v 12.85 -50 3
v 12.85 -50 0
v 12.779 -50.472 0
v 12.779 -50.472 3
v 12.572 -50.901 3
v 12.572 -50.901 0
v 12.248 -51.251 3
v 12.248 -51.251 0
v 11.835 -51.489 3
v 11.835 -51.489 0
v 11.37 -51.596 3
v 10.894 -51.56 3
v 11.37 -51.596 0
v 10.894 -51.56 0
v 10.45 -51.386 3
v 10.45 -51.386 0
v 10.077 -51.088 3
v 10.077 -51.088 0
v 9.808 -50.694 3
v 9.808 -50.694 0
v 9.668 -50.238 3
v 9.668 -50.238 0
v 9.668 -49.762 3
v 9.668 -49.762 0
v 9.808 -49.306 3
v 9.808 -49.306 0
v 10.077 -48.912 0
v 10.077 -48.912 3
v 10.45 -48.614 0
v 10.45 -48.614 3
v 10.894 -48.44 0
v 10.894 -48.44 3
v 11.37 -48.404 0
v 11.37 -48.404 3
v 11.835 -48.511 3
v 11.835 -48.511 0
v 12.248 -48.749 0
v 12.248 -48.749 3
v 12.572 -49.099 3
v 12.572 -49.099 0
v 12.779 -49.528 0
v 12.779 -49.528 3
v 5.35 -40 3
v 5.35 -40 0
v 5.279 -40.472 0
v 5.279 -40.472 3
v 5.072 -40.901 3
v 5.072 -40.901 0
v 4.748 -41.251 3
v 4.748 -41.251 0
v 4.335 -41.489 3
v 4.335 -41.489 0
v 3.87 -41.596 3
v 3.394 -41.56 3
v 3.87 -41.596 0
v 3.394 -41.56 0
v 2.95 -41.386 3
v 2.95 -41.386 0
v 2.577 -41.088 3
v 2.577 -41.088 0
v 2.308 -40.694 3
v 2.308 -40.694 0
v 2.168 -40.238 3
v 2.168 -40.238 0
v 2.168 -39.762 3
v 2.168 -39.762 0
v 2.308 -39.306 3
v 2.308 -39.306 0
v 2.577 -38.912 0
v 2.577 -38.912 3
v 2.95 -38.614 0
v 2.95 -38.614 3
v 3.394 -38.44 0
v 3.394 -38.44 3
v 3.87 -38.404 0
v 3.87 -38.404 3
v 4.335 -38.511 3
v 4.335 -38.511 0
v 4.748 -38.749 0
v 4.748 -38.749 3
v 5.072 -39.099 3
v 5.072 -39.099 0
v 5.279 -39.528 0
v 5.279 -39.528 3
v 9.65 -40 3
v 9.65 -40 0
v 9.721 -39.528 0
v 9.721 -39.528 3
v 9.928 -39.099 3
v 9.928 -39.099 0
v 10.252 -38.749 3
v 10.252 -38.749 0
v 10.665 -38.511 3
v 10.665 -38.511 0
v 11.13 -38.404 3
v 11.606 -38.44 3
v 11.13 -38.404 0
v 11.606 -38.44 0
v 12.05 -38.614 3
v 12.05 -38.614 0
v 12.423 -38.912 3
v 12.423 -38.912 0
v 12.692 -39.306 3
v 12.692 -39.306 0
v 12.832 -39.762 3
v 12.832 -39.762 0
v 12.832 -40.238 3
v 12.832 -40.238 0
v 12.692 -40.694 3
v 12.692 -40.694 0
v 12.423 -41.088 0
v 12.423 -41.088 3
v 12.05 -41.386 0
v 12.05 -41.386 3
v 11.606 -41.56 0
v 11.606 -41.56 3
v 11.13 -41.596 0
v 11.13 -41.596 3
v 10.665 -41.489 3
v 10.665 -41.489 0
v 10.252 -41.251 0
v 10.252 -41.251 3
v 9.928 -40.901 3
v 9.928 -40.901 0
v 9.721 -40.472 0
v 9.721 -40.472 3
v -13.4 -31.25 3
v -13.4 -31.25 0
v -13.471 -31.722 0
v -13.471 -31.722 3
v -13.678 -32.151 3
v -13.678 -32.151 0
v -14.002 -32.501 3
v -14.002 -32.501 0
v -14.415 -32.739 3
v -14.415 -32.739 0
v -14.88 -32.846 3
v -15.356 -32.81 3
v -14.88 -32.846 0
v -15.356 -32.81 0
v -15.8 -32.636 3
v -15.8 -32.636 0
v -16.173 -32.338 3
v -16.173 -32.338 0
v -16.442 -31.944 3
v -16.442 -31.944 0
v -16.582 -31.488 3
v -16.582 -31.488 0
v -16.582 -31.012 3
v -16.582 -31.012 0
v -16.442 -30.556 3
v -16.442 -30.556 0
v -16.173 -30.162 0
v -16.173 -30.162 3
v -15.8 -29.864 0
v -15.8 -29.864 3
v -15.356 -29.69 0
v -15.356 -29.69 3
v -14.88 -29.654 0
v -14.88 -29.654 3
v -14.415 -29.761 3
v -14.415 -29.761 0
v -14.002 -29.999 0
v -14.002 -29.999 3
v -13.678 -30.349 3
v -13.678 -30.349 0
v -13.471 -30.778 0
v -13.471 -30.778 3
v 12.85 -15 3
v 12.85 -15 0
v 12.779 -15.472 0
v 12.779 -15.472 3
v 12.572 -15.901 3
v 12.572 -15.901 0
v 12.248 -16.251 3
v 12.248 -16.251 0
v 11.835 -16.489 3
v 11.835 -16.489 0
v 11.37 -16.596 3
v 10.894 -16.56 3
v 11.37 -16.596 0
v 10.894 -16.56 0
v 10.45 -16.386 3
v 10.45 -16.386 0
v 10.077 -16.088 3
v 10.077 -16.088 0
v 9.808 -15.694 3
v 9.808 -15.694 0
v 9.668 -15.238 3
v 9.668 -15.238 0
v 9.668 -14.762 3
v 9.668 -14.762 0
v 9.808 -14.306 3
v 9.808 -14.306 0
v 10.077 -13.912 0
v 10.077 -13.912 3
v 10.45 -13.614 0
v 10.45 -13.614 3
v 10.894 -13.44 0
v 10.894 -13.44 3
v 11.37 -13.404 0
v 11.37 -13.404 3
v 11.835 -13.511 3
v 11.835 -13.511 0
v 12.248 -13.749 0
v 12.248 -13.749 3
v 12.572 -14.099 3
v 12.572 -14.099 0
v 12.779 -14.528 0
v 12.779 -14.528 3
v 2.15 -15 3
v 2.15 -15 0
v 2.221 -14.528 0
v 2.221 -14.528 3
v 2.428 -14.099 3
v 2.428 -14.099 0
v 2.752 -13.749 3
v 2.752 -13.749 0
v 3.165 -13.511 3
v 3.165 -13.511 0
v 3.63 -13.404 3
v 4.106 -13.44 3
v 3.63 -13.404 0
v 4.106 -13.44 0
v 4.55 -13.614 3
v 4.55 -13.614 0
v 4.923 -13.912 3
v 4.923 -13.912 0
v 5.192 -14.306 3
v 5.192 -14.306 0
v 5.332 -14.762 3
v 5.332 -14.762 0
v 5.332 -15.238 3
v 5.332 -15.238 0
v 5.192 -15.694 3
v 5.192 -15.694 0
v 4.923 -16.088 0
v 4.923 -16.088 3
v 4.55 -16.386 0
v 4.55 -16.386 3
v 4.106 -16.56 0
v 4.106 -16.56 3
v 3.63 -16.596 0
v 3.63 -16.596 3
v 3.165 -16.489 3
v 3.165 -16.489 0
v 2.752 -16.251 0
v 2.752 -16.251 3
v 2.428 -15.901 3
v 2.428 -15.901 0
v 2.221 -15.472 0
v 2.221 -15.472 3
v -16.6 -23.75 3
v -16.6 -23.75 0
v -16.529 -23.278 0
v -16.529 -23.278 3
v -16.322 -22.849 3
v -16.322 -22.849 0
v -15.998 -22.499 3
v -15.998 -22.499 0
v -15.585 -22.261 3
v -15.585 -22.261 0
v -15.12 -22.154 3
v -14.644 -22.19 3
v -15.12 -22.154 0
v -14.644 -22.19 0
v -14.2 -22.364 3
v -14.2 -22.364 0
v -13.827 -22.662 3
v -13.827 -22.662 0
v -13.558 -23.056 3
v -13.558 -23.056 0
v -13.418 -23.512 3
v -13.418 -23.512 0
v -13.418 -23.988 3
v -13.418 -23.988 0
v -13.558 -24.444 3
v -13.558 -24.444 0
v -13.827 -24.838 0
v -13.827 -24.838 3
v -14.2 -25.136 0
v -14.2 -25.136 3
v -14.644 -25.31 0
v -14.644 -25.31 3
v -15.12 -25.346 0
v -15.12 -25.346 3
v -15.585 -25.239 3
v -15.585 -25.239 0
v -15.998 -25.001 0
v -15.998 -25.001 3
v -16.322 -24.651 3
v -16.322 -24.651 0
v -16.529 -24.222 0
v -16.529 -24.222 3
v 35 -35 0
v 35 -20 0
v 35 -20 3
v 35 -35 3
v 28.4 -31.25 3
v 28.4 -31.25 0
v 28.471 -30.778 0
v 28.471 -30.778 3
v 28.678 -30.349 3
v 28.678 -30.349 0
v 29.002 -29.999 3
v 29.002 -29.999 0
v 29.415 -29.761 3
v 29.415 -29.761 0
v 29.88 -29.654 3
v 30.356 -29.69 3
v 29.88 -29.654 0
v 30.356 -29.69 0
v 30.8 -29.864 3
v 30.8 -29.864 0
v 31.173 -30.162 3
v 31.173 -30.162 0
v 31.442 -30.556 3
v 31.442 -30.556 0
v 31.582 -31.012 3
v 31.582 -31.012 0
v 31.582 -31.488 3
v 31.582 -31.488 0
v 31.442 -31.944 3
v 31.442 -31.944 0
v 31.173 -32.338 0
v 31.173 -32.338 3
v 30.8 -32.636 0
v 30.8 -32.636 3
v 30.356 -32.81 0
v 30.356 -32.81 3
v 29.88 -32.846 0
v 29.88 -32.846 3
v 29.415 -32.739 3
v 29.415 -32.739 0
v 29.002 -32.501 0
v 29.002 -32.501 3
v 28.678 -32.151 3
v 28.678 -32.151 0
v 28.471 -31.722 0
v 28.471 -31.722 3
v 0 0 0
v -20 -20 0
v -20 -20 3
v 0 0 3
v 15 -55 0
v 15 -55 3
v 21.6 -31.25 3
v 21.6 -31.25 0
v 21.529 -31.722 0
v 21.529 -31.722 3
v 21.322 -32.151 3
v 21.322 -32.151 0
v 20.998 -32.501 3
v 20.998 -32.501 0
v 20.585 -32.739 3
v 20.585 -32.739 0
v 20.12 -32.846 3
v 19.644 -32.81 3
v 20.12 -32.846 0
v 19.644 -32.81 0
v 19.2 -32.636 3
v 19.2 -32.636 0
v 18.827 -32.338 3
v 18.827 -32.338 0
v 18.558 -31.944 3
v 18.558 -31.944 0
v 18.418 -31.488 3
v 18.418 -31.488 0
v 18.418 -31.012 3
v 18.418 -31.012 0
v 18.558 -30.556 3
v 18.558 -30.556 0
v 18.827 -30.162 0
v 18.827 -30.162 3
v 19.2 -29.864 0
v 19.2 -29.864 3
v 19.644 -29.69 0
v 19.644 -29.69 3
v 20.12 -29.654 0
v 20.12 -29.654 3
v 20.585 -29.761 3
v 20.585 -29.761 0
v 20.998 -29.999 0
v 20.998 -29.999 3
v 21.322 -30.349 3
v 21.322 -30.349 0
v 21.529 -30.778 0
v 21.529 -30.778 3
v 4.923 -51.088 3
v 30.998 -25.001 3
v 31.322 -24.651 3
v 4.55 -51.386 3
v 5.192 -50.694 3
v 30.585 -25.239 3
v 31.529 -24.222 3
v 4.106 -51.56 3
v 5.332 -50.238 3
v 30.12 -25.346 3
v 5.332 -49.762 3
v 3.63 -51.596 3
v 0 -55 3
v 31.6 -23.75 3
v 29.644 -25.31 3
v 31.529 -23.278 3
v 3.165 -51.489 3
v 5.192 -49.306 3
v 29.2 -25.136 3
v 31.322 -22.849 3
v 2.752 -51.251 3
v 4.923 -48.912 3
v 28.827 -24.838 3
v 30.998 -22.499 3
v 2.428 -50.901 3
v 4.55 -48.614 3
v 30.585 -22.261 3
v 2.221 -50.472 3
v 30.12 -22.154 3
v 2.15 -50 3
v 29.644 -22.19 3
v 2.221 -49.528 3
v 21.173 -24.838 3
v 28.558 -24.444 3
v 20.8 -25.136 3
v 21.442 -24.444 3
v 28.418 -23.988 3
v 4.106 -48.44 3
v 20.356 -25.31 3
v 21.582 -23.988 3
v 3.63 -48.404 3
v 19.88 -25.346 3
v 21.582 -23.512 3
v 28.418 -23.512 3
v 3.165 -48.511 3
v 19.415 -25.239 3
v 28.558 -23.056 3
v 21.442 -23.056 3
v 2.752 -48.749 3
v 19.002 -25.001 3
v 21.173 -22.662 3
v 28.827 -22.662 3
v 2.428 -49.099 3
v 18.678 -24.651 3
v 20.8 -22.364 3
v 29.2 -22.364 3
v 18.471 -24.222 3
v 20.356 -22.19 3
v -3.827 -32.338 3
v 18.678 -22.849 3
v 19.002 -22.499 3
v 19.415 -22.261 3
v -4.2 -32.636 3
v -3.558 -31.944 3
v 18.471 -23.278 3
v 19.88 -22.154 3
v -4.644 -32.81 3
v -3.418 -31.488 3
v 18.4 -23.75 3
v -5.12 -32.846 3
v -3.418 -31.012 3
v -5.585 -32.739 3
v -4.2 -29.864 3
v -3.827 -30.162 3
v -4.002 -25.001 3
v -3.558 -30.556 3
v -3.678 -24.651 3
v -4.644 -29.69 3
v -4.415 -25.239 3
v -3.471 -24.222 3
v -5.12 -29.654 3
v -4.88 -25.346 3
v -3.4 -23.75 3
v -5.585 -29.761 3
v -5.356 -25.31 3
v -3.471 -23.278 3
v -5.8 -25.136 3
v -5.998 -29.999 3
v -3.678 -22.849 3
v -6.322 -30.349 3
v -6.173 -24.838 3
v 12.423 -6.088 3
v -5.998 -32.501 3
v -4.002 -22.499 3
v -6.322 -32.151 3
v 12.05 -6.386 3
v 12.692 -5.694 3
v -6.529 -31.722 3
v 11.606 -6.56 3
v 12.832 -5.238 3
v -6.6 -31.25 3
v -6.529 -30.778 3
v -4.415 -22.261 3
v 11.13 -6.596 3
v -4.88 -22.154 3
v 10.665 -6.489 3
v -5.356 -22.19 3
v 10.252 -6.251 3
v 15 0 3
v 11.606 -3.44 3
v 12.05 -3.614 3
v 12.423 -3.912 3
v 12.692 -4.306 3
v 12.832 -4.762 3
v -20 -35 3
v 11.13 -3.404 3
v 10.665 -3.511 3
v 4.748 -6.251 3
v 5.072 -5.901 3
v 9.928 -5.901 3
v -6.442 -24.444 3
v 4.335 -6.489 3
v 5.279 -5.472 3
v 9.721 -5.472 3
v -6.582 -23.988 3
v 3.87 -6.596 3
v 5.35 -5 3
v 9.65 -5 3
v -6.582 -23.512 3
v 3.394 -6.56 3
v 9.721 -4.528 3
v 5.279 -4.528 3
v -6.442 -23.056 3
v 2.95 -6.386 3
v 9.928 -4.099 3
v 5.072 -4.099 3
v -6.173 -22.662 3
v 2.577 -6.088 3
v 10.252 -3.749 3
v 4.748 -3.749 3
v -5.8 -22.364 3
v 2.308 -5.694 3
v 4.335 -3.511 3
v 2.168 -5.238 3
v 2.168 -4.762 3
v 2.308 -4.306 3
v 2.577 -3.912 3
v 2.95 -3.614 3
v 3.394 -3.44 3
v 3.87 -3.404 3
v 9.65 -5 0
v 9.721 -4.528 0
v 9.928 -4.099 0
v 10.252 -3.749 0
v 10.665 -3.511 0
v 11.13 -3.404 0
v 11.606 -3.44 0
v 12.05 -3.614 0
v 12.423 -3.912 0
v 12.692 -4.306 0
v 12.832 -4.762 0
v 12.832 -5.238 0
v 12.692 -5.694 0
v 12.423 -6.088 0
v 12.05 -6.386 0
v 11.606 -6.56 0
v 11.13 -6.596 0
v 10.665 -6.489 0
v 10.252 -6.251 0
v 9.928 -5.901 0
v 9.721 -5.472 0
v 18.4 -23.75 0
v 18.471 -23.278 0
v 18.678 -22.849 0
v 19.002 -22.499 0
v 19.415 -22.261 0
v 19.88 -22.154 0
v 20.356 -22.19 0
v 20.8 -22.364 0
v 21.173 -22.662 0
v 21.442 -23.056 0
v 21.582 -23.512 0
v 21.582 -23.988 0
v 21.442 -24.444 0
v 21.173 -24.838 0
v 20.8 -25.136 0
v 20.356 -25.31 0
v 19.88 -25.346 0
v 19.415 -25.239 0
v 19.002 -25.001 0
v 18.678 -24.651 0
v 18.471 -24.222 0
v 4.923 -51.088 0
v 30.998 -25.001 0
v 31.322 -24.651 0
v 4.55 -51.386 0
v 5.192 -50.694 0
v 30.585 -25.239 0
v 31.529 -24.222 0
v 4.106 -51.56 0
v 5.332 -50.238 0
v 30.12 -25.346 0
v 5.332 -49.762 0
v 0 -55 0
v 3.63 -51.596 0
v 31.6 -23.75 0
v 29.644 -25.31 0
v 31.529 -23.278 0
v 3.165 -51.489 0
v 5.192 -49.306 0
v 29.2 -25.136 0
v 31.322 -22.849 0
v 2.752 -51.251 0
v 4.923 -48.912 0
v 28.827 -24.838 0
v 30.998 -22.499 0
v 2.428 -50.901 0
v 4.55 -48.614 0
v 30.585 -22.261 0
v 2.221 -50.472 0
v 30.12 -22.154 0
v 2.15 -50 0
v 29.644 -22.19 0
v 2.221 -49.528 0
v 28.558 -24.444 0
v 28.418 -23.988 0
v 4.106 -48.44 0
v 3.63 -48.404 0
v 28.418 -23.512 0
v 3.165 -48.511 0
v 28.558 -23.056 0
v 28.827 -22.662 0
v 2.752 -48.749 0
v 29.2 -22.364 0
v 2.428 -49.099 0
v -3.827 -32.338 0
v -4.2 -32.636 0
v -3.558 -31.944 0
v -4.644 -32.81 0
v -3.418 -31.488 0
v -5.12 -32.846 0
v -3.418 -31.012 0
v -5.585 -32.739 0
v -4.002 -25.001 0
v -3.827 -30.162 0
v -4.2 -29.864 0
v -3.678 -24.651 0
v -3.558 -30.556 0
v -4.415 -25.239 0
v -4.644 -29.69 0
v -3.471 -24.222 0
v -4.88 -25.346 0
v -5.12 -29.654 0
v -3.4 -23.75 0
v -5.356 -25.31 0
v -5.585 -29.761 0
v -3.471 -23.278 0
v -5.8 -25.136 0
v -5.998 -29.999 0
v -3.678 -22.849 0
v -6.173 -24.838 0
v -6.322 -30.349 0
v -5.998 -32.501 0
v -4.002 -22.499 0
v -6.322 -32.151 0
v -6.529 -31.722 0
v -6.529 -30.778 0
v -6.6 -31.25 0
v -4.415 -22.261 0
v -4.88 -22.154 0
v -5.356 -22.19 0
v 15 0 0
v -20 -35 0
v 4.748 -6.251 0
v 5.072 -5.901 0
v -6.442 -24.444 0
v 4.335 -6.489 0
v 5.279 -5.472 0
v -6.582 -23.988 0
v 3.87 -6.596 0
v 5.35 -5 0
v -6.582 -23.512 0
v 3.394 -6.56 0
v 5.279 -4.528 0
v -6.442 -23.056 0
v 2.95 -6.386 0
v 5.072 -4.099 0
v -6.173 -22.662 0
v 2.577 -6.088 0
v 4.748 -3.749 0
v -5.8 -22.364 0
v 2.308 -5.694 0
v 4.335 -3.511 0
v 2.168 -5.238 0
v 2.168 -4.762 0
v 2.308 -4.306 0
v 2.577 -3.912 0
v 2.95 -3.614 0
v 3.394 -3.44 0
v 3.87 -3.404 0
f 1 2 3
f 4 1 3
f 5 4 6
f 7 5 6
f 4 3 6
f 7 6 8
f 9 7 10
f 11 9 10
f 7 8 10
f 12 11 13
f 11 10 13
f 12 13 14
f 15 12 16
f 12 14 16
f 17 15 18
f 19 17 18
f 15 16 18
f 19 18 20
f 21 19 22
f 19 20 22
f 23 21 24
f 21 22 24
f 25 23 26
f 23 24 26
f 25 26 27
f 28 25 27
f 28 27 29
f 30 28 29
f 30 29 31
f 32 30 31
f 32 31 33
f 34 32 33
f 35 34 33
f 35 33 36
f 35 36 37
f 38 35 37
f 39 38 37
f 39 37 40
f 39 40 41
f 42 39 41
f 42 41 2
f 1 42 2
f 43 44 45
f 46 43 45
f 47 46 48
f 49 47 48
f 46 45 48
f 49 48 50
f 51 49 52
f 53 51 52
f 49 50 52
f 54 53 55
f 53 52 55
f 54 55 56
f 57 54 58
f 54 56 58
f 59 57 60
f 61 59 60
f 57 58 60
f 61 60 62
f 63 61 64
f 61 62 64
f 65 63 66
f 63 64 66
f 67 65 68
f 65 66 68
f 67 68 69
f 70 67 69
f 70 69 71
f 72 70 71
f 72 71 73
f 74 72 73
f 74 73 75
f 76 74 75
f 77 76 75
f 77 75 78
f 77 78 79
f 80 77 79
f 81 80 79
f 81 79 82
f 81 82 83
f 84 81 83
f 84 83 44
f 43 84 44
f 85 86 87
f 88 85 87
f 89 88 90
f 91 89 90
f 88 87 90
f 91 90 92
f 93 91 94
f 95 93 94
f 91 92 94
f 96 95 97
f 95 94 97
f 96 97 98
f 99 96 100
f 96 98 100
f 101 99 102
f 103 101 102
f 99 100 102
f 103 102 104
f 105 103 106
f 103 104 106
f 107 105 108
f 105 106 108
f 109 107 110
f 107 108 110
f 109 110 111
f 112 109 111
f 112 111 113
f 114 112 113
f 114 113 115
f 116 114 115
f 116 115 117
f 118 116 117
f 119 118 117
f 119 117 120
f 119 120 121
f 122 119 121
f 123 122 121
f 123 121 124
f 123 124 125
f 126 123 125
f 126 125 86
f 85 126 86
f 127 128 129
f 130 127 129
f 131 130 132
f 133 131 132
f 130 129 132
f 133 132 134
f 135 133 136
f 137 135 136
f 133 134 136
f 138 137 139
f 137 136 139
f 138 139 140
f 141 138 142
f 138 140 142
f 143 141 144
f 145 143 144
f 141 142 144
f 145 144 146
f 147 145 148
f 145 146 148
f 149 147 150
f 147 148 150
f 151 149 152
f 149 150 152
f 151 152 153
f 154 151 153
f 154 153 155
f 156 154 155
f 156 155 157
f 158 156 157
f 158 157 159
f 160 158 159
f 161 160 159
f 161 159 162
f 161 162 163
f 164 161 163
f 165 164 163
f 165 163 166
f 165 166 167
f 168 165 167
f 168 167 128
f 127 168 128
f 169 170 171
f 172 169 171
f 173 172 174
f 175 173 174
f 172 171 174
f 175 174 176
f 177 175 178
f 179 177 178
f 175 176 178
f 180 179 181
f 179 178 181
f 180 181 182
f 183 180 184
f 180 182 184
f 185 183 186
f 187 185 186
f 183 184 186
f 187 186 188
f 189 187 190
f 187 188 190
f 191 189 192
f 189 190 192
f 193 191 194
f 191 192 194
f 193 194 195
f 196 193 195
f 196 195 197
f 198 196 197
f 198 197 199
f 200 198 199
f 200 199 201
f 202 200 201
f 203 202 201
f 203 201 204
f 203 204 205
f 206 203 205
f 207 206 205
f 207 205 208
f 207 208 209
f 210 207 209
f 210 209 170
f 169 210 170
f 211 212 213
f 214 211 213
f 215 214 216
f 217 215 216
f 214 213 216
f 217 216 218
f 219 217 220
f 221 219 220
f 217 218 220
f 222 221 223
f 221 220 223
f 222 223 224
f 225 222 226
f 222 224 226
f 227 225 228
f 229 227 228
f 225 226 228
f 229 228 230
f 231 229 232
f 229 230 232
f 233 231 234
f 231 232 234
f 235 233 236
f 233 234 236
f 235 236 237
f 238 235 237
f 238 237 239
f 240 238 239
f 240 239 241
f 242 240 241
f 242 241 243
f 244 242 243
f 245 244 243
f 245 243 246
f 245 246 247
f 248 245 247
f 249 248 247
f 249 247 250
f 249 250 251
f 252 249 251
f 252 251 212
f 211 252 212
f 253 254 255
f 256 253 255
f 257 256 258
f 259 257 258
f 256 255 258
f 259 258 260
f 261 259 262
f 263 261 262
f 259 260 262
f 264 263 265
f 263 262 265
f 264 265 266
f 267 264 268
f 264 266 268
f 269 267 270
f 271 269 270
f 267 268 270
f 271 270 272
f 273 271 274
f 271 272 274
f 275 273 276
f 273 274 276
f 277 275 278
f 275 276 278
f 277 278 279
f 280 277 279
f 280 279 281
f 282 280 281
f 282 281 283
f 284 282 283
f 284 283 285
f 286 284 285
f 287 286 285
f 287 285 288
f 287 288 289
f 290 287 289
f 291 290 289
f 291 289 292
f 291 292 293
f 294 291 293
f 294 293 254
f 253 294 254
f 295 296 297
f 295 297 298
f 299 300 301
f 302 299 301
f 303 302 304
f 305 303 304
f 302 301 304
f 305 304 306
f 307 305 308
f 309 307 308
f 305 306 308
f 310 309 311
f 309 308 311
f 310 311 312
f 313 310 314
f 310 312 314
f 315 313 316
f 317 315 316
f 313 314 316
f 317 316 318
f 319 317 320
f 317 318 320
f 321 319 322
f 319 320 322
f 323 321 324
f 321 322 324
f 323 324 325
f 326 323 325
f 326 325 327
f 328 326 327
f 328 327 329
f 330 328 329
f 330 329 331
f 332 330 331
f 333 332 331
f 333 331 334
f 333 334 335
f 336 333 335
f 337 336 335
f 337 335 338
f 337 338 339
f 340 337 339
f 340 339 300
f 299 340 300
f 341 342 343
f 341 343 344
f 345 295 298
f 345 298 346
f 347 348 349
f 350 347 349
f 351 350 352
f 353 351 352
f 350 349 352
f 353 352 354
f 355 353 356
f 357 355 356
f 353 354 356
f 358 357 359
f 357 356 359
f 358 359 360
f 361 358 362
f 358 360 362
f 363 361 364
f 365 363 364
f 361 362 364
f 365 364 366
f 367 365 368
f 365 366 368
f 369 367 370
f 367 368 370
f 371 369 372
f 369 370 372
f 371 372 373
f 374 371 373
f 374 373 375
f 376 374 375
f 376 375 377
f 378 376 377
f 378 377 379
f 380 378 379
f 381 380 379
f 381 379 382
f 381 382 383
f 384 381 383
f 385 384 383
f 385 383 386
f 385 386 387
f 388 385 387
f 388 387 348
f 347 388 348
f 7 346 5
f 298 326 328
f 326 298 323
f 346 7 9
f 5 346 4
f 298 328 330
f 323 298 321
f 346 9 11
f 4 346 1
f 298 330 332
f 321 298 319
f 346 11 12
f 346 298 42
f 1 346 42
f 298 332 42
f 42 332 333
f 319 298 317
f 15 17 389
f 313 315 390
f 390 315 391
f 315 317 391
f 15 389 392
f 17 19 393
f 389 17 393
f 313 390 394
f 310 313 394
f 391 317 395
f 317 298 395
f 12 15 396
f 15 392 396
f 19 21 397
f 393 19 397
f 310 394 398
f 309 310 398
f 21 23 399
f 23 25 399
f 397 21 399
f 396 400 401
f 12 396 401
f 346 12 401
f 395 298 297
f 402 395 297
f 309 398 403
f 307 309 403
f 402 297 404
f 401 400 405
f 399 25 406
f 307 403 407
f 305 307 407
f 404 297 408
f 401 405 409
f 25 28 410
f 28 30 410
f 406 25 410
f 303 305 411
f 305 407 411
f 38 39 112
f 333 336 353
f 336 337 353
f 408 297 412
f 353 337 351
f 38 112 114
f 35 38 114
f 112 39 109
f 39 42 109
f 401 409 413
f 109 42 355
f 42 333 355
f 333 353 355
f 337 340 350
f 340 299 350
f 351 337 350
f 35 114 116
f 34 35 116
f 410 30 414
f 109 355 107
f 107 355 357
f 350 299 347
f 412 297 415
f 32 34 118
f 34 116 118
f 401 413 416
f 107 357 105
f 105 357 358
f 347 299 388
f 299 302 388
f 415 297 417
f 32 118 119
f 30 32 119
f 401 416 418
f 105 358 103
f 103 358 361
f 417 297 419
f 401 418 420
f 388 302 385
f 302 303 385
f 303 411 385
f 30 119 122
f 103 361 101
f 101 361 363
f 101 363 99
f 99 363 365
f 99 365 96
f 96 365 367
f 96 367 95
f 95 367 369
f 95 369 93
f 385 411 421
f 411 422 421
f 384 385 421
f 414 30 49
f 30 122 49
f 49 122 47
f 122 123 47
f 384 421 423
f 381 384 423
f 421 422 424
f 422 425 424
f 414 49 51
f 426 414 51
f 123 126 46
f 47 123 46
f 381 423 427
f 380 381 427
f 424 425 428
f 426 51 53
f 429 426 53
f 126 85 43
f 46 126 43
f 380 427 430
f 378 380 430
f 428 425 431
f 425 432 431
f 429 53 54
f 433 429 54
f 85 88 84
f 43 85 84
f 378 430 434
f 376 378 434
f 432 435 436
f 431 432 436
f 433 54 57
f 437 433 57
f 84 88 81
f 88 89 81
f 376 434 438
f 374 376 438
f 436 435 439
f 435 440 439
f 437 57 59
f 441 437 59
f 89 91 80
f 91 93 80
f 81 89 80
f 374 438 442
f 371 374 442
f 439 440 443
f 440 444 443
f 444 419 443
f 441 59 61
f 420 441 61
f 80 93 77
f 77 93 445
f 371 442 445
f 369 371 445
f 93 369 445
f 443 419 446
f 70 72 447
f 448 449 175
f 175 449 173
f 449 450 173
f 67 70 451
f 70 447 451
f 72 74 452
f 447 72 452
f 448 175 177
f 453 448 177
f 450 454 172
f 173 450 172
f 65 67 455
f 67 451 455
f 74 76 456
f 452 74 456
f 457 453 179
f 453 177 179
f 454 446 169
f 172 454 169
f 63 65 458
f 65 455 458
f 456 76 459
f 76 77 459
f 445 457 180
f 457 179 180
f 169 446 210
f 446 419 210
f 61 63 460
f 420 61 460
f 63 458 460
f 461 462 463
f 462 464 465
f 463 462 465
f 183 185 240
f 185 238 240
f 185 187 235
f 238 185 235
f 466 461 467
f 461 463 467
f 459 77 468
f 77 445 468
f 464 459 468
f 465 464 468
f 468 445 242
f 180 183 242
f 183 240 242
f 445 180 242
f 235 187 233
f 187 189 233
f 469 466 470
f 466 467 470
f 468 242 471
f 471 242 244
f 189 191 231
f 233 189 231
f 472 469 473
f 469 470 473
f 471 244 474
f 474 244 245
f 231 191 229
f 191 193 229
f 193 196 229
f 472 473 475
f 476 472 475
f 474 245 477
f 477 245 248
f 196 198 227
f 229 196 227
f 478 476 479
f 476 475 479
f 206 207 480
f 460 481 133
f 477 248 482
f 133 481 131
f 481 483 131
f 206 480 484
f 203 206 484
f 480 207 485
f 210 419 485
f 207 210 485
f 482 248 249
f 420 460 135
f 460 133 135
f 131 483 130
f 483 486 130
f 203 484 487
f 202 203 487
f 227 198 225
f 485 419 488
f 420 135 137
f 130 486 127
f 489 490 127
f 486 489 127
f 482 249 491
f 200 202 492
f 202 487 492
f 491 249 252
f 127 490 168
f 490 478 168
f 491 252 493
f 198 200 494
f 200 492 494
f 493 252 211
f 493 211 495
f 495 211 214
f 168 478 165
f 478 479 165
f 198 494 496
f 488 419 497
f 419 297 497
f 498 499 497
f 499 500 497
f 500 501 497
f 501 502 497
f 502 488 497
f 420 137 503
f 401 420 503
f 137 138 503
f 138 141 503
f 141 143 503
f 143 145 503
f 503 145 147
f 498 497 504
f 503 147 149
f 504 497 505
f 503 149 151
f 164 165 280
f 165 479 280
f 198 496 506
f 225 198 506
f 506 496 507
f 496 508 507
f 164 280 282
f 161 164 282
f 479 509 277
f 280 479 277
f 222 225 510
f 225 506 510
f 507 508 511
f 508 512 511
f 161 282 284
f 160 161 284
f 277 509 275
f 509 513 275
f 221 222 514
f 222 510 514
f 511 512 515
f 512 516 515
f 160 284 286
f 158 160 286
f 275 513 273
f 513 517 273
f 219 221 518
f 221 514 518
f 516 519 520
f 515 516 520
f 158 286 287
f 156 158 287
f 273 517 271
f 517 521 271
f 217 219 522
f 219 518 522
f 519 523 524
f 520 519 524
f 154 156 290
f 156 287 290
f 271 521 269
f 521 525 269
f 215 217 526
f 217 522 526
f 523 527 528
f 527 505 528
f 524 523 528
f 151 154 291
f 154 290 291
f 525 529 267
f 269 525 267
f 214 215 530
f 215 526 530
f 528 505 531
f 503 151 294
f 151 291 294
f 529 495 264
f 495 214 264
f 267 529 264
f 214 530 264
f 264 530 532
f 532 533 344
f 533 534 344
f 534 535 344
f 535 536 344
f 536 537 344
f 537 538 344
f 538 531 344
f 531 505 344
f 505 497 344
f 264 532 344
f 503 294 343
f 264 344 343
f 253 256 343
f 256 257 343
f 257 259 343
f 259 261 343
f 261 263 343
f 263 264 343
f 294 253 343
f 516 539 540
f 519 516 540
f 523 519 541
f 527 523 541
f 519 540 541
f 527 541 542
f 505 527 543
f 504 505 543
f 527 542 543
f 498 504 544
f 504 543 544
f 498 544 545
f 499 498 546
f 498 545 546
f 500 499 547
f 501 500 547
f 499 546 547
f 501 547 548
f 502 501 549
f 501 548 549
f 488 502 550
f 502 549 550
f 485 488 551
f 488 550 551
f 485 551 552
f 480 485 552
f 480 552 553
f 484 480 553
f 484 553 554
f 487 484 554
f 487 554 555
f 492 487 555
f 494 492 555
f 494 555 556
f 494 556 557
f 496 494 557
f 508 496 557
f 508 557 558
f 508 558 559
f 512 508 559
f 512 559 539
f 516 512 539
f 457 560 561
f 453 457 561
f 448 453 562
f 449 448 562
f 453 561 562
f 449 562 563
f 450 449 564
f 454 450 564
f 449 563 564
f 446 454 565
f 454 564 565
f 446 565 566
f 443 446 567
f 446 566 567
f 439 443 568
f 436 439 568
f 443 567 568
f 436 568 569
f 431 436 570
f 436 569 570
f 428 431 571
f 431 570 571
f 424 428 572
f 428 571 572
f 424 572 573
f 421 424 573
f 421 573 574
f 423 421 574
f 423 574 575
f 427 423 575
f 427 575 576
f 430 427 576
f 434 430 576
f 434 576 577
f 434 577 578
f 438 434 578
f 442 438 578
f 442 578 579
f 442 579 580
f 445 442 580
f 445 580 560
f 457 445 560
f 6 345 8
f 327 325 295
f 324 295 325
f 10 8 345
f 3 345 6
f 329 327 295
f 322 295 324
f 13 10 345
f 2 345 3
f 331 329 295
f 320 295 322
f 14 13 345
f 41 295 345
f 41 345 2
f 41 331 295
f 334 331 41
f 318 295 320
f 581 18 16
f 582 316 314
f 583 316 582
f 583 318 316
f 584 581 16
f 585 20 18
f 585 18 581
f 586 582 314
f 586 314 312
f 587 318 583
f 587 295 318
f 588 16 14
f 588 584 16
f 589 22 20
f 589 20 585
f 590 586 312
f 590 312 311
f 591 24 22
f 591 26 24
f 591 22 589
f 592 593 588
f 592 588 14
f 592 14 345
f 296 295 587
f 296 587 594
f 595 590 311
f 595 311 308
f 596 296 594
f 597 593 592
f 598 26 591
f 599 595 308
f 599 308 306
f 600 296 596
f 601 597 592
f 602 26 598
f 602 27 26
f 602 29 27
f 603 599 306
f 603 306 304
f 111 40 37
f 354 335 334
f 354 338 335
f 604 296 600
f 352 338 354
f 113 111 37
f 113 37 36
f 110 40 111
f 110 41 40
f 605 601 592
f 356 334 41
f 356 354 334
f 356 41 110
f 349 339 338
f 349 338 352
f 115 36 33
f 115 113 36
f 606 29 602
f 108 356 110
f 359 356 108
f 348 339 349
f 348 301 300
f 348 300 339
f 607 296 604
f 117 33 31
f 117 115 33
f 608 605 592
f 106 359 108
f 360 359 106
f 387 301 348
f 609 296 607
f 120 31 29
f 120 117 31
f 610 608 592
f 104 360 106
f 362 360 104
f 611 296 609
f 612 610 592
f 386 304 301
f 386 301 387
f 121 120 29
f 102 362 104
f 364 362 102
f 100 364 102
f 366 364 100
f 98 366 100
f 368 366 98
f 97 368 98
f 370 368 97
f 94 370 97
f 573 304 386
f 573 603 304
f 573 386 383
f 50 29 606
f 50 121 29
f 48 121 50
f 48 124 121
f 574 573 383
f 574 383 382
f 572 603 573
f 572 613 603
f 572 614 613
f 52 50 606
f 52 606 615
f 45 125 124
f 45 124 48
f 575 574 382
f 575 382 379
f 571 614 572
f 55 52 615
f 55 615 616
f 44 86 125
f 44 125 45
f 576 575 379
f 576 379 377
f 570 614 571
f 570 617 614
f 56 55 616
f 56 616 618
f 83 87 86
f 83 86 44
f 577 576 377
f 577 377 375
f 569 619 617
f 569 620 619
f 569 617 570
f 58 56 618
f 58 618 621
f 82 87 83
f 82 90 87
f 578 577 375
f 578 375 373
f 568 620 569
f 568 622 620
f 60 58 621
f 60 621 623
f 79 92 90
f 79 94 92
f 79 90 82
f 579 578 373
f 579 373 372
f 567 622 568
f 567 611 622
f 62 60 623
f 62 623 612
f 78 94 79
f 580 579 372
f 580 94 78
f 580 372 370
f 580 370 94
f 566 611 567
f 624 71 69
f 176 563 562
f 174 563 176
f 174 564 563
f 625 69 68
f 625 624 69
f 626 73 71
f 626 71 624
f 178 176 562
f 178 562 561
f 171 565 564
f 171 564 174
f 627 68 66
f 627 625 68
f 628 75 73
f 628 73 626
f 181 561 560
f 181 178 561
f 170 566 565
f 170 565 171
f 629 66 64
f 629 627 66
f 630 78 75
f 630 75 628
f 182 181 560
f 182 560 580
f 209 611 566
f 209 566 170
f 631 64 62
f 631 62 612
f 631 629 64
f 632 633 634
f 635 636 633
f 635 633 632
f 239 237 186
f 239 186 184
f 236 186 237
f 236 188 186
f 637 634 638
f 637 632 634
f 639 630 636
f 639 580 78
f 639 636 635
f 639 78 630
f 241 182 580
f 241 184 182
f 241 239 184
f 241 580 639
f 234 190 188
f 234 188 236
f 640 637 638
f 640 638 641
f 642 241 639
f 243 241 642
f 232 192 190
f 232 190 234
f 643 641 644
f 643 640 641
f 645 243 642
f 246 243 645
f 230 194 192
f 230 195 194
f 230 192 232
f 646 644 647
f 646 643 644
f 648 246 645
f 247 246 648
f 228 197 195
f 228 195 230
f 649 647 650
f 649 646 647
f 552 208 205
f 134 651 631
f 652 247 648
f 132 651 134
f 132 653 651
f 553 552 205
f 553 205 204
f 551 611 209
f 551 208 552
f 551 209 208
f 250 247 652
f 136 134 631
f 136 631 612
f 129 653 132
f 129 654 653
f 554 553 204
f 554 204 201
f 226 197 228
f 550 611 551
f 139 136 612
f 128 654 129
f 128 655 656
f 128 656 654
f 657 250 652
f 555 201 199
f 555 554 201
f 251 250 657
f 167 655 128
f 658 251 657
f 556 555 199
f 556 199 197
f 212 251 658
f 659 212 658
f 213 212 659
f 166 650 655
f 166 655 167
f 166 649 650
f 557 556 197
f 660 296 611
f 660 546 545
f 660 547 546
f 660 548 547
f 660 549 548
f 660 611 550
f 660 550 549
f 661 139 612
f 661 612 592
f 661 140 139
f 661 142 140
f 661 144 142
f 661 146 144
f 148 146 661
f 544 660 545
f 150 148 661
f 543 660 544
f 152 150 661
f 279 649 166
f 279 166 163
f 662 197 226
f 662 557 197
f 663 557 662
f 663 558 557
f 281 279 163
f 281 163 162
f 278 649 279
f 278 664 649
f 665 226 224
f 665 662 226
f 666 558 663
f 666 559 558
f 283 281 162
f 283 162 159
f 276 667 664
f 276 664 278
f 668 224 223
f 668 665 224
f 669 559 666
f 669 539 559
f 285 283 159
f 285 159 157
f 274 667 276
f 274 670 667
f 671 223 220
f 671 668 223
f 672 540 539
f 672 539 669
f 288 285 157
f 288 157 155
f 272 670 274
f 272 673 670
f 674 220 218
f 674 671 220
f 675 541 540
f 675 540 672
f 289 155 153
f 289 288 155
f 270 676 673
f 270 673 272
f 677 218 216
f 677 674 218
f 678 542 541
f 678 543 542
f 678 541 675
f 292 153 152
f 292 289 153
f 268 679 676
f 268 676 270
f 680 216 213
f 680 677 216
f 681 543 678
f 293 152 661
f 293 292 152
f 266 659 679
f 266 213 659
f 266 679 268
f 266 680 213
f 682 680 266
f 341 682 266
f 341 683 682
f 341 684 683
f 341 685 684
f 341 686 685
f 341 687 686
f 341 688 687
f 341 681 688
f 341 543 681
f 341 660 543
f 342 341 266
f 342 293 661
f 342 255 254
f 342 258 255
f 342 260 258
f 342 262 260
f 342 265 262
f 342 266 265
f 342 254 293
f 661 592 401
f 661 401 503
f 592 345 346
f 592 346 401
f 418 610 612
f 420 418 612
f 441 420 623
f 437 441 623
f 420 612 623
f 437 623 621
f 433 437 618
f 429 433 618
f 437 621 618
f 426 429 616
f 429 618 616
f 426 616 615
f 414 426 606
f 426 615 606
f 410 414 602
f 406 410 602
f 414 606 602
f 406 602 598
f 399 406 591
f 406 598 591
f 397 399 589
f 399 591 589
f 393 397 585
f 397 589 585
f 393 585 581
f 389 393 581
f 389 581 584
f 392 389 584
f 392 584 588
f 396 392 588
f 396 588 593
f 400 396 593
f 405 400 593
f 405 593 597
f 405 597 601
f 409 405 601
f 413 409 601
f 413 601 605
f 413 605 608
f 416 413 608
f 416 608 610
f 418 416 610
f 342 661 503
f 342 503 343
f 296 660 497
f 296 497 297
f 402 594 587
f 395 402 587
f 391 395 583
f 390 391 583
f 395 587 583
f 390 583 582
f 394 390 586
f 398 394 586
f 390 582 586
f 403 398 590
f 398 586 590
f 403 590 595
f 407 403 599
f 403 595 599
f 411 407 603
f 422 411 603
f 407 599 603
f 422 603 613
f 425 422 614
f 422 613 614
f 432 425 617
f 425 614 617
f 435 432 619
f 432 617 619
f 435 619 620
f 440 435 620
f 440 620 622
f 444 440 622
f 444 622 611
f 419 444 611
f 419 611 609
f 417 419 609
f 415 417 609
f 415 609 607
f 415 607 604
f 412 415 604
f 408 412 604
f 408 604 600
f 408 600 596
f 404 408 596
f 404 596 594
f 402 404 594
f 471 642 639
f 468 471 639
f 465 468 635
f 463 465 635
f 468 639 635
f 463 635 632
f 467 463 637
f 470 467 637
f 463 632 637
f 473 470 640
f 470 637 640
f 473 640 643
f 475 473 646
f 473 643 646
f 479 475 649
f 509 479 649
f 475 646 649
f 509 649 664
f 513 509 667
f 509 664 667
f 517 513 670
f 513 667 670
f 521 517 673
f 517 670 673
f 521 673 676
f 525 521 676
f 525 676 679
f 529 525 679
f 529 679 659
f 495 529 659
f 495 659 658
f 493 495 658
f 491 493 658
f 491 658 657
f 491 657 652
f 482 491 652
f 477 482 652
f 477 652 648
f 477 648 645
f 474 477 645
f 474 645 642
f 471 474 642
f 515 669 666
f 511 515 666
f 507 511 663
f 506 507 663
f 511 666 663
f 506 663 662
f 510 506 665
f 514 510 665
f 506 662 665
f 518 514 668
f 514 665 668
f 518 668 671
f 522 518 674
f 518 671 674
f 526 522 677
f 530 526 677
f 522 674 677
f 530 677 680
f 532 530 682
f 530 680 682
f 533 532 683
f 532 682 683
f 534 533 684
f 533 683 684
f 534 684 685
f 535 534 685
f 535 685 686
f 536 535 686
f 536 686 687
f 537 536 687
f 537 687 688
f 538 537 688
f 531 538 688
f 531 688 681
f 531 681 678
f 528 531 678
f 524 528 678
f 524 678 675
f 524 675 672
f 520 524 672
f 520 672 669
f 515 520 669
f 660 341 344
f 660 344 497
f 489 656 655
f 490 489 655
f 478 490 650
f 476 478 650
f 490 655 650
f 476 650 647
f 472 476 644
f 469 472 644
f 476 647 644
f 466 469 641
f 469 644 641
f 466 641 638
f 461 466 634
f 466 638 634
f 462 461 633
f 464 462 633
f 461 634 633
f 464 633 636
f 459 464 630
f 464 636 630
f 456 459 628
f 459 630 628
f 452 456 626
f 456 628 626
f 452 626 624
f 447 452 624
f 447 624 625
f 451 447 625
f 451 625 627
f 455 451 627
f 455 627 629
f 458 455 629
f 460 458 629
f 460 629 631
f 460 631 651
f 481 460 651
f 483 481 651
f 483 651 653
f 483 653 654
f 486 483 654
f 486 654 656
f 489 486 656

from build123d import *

# Parameters (mm, degrees)
EXTRUDE_1_DEPTH     = 3
SKETCH_2_R          = 1.6
CUT_EXTRUDE_1_DEPTH = 66.261014396


with BuildPart() as part:
    # 草图1 → 凸台-拉伸1 (new body)
    with BuildSketch(Plane.XY):
        Polygon((0, 0), (15, 0), (35, -20), (35, -35), (15, -55), (0, -55), (-20, -35), (-20, -20), align=None)
    extrude(amount=EXTRUDE_1_DEPTH)

    # 草图2 → 切除-拉伸1 (cut, through all)
    with BuildSketch(Plane(origin=(0, 0, 0), x_dir=(-1, 0, 0), z_dir=(0, 0, -1))):
        with Locations((-11.25, -5)):
            Circle(SKETCH_2_R)
        with Locations((-30, -31.25)):
            Circle(SKETCH_2_R)
        with Locations(Location((-30, -23.75, 0), (0, 0, 180))):
            Circle(SKETCH_2_R)
        with Locations(Location((-3.75, -5, 0), (0, 0, 180))):
            Circle(SKETCH_2_R)
        with Locations((-3.75, -15)):
            Circle(SKETCH_2_R)
        with Locations(Location((-11.25, -15, 0), (0, 0, 180))):
            Circle(SKETCH_2_R)
        with Locations((-20, -23.75)):
            Circle(SKETCH_2_R)
        with Locations(Location((-20, -31.25, 0), (0, 0, 180))):
            Circle(SKETCH_2_R)
        with Locations((5, -31.25)):
            Circle(SKETCH_2_R)
        with Locations(Location((5, -23.75, 0), (0, 0, 180))):
            Circle(SKETCH_2_R)
        with Locations((15, -23.75)):
            Circle(SKETCH_2_R)
        with Locations(Location((15, -31.25, 0), (0, 0, 180))):
            Circle(SKETCH_2_R)
        with Locations((-11.25, -40)):
            Circle(SKETCH_2_R)
        with Locations(Location((-3.75, -40, 0), (0, 0, 180))):
            Circle(SKETCH_2_R)
        with Locations((-3.75, -50)):
            Circle(SKETCH_2_R)
        with Locations(Location((-11.25, -50, 0), (0, 0, 180))):
            Circle(SKETCH_2_R)
    extrude(amount=-CUT_EXTRUDE_1_DEPTH, mode=Mode.SUBTRACT)


solid = part.part
